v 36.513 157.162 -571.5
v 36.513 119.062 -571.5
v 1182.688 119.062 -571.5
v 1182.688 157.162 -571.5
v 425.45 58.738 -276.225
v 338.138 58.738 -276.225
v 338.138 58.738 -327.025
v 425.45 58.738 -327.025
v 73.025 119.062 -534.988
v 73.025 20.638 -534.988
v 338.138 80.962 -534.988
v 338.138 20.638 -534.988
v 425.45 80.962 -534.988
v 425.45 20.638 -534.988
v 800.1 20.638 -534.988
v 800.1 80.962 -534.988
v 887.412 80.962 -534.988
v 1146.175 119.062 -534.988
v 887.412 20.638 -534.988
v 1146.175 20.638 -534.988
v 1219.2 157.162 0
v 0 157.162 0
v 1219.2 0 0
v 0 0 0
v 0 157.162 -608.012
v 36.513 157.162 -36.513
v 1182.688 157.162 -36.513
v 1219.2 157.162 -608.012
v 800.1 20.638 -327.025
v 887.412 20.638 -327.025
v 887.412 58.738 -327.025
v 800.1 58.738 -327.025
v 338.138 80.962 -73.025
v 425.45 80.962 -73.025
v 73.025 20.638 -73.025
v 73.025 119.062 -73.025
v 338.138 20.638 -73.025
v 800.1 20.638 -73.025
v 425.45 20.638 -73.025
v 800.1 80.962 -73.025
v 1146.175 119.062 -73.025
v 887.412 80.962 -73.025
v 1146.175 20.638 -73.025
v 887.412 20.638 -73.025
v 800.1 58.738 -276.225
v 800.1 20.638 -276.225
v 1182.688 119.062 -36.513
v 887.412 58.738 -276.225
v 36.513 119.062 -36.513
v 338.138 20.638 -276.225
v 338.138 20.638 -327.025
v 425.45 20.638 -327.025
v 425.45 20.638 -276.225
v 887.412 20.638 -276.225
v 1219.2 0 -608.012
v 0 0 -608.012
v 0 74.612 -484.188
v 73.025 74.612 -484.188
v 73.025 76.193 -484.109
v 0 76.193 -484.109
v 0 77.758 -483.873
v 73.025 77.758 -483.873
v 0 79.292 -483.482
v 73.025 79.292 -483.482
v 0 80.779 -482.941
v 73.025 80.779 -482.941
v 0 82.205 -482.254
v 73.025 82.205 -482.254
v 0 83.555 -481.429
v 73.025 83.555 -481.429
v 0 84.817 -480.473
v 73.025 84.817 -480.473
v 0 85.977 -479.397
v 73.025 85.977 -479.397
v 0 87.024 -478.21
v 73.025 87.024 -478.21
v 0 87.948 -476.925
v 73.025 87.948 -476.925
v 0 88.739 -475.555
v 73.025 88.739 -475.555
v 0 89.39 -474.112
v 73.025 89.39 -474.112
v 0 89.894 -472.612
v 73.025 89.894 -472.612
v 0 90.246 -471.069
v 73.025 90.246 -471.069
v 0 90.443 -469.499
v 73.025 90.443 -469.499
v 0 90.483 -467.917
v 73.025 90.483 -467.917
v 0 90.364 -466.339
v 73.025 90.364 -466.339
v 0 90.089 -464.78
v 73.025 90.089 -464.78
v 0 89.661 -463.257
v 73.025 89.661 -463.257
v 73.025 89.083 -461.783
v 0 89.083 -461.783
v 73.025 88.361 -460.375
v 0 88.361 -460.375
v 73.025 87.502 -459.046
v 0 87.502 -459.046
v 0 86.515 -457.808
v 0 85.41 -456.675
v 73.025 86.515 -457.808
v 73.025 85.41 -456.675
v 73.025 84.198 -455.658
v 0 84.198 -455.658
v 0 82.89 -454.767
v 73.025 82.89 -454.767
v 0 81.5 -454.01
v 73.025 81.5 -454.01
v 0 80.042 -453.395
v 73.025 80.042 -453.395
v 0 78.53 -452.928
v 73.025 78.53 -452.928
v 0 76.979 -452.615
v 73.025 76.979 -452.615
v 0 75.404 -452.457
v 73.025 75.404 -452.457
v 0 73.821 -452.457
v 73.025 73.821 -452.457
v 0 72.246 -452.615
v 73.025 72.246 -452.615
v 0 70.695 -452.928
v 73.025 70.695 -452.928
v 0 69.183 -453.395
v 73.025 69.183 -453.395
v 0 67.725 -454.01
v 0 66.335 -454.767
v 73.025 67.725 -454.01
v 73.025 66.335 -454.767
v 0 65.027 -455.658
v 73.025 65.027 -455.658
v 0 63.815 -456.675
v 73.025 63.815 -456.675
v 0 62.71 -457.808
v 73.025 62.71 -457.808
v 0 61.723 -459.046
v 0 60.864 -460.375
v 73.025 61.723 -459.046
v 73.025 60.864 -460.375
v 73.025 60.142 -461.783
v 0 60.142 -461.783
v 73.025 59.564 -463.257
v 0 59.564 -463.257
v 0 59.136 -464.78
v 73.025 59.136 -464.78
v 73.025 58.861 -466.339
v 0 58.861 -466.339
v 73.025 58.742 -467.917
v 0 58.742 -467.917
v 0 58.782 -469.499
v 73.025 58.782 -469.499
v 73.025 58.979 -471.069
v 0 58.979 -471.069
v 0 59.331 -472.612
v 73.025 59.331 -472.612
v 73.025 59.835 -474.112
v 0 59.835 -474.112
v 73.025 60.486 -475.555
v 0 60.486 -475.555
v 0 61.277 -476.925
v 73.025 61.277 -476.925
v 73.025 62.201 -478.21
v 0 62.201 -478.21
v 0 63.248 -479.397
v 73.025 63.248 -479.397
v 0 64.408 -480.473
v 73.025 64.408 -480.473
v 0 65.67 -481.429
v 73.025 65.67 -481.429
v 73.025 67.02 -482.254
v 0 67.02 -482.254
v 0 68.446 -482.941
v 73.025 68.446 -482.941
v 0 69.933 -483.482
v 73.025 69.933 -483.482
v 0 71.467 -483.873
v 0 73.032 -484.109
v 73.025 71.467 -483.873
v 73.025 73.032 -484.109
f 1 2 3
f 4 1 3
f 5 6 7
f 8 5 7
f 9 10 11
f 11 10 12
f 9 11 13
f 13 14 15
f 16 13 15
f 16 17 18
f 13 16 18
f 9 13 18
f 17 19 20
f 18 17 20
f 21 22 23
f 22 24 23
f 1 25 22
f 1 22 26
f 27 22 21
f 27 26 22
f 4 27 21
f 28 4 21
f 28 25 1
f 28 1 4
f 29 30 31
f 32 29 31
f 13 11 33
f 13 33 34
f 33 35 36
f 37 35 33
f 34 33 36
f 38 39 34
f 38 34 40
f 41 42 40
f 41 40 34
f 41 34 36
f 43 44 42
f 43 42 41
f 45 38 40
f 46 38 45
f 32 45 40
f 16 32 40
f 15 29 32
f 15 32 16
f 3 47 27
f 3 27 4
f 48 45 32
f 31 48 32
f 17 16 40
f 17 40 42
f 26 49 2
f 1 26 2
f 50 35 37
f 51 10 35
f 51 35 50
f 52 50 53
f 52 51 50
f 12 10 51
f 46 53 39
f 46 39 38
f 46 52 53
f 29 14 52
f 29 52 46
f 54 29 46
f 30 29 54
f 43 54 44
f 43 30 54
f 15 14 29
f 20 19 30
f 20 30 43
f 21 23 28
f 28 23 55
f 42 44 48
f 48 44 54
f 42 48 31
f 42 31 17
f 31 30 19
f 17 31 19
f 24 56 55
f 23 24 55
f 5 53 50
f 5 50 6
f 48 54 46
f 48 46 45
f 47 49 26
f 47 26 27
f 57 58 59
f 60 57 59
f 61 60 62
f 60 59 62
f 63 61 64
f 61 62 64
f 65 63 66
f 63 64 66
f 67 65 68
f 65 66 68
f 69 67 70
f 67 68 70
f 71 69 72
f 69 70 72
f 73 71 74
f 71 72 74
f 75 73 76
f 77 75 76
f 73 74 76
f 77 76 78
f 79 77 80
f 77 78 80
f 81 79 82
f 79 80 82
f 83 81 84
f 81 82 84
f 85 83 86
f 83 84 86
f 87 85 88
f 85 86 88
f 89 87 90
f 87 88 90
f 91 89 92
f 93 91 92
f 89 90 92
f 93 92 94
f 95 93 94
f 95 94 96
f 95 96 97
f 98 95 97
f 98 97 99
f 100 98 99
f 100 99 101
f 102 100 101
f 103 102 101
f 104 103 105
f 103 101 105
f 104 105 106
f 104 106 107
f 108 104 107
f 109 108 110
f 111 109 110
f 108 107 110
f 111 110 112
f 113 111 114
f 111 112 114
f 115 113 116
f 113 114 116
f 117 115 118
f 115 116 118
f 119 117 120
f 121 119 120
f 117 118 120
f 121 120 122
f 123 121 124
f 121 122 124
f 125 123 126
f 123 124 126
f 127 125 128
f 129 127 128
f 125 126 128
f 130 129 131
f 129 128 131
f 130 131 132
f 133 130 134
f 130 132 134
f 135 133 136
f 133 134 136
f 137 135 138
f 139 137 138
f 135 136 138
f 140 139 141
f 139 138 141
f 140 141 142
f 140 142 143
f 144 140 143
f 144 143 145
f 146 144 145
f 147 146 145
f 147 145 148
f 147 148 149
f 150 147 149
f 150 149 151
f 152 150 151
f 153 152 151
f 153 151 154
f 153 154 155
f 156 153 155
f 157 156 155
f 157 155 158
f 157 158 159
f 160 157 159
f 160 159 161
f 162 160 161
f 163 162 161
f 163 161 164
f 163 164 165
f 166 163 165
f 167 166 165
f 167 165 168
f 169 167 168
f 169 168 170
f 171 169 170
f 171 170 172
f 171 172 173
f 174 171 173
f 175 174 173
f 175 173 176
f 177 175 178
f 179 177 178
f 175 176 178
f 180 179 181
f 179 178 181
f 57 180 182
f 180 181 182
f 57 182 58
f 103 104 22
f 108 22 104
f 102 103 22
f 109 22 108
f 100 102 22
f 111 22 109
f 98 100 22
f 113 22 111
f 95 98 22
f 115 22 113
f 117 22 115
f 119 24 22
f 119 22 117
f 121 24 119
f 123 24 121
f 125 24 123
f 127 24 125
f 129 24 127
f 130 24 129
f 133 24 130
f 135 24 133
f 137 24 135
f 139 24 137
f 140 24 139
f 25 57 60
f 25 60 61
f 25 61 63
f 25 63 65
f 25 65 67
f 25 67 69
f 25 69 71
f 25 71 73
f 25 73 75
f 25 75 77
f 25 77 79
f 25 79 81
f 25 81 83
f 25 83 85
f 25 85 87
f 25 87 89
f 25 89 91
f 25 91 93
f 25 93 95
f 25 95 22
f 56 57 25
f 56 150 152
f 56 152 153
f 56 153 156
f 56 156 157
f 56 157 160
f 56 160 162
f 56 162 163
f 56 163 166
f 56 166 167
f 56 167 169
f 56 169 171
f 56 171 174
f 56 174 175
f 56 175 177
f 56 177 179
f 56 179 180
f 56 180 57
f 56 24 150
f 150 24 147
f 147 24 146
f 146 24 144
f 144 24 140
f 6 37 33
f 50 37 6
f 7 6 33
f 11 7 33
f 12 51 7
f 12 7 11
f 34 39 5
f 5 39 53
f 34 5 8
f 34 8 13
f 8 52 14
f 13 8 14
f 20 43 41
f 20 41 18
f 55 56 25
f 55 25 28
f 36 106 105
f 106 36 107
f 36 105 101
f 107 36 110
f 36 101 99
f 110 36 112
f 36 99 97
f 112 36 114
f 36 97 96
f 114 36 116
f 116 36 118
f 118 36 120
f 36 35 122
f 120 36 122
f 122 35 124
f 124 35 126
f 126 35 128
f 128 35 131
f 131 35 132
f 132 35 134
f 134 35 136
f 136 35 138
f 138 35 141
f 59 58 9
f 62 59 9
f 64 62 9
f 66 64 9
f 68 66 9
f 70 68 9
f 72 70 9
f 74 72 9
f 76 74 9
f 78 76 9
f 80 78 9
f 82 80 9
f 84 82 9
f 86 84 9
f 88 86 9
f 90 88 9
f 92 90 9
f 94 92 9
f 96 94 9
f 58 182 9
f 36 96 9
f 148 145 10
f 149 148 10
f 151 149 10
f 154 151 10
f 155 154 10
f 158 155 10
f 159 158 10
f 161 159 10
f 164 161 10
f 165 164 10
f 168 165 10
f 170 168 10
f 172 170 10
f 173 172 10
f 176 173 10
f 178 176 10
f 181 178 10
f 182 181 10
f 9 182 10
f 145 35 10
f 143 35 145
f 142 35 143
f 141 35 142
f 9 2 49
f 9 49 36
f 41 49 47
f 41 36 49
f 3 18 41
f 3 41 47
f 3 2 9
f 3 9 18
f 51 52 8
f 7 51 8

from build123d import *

# Parameters (mm, degrees)
SKETCH3_W           = 1219.2
SKETCH3_H           = 608.0125
BOSS_EXTRUDE1_DEPTH = 20.6375
SKETCH4_W           = 1219.2
SKETCH4_H           = 608.0125
SKETCH4_W_2         = 1146.175
SKETCH4_H_2         = 534.9875
BOSS_EXTRUDE2_DEPTH = 136.525
SKETCH5_W           = 1146.175
SKETCH5_H           = 534.9875
SKETCH5_W_2         = 1073.15
SKETCH5_H_2         = 461.9625
BOSS_EXTRUDE3_DEPTH = 98.425
SKETCH6_W           = 87.3125
SKETCH6_H           = 461.9625
BOSS_EXTRUDE4_DEPTH = 60.325
SKETCH7_W           = 50.8
SKETCH7_H           = 38.1
CUT_EXTRUDE1_DEPTH  = 549.275
SKETCH8_R           = 15.875
CUT_EXTRUDE2_DEPTH  = 73.025


with BuildPart() as part:
    # Sketch3 → Boss-Extrude1 (new body)
    with BuildSketch(Plane(origin=(0, 0, 0), x_dir=(1, 0, 0), z_dir=(0, 1, 0))):
        with Locations((609.6, 304.00625)):
            Rectangle(SKETCH3_W, SKETCH3_H)
    extrude(amount=BOSS_EXTRUDE1_DEPTH)

    # Sketch4 → Boss-Extrude2 (add)
    with BuildSketch(Plane(origin=(0, 20.6375, 0), x_dir=(1, 0, 0), z_dir=(0, 1, 0))):
        with Locations((609.6, 304.00625)):
            Rectangle(SKETCH4_W, SKETCH4_H)
        with Locations((609.6, 304.00625)):
            Rectangle(SKETCH4_W_2, SKETCH4_H_2, mode=Mode.SUBTRACT)
    extrude(amount=BOSS_EXTRUDE2_DEPTH)

    # Sketch5 → Boss-Extrude3 (add)
    with BuildSketch(Plane(origin=(0, 20.6375, 0), x_dir=(1, 0, 0), z_dir=(0, 1, 0))):
        with Locations((609.6, 304.00625)):
            Rectangle(SKETCH5_W, SKETCH5_H)
        with Locations((609.6, 304.00625)):
            Rectangle(SKETCH5_W_2, SKETCH5_H_2, mode=Mode.SUBTRACT)
    extrude(amount=BOSS_EXTRUDE3_DEPTH)

    # Sketch6 → Boss-Extrude4 (add)
    with BuildSketch(Plane(origin=(0, 20.6375, 0), x_dir=(1, 0, 0), z_dir=(0, 1, 0))):
        with Locations((843.75625, 304.00625)):
            Rectangle(SKETCH6_W, SKETCH6_H)
        with Locations((381.79375, 304.00625)):
            Rectangle(SKETCH6_W, SKETCH6_H)
    extrude(amount=BOSS_EXTRUDE4_DEPTH)

    # Sketch7 → Cut-Extrude1 (cut)
    with BuildSketch(Plane(origin=(887.4125, 0, 0), x_dir=(0, 0, -1), z_dir=(1, 0, 0))):
        with Locations((301.625, 39.6875)):
            Rectangle(SKETCH7_W, SKETCH7_H)
    extrude(amount=-CUT_EXTRUDE1_DEPTH, mode=Mode.SUBTRACT)

    # Sketch8 → Cut-Extrude2 (cut)
    with BuildSketch(Plane(origin=(73.025, 0, 0), x_dir=(0, 0, -1), z_dir=(1, 0, 0))):
        with Locations((468.3125, 74.6125)):
            Circle(SKETCH8_R)
    extrude(amount=-CUT_EXTRUDE2_DEPTH, mode=Mode.SUBTRACT)


solid = part.part
